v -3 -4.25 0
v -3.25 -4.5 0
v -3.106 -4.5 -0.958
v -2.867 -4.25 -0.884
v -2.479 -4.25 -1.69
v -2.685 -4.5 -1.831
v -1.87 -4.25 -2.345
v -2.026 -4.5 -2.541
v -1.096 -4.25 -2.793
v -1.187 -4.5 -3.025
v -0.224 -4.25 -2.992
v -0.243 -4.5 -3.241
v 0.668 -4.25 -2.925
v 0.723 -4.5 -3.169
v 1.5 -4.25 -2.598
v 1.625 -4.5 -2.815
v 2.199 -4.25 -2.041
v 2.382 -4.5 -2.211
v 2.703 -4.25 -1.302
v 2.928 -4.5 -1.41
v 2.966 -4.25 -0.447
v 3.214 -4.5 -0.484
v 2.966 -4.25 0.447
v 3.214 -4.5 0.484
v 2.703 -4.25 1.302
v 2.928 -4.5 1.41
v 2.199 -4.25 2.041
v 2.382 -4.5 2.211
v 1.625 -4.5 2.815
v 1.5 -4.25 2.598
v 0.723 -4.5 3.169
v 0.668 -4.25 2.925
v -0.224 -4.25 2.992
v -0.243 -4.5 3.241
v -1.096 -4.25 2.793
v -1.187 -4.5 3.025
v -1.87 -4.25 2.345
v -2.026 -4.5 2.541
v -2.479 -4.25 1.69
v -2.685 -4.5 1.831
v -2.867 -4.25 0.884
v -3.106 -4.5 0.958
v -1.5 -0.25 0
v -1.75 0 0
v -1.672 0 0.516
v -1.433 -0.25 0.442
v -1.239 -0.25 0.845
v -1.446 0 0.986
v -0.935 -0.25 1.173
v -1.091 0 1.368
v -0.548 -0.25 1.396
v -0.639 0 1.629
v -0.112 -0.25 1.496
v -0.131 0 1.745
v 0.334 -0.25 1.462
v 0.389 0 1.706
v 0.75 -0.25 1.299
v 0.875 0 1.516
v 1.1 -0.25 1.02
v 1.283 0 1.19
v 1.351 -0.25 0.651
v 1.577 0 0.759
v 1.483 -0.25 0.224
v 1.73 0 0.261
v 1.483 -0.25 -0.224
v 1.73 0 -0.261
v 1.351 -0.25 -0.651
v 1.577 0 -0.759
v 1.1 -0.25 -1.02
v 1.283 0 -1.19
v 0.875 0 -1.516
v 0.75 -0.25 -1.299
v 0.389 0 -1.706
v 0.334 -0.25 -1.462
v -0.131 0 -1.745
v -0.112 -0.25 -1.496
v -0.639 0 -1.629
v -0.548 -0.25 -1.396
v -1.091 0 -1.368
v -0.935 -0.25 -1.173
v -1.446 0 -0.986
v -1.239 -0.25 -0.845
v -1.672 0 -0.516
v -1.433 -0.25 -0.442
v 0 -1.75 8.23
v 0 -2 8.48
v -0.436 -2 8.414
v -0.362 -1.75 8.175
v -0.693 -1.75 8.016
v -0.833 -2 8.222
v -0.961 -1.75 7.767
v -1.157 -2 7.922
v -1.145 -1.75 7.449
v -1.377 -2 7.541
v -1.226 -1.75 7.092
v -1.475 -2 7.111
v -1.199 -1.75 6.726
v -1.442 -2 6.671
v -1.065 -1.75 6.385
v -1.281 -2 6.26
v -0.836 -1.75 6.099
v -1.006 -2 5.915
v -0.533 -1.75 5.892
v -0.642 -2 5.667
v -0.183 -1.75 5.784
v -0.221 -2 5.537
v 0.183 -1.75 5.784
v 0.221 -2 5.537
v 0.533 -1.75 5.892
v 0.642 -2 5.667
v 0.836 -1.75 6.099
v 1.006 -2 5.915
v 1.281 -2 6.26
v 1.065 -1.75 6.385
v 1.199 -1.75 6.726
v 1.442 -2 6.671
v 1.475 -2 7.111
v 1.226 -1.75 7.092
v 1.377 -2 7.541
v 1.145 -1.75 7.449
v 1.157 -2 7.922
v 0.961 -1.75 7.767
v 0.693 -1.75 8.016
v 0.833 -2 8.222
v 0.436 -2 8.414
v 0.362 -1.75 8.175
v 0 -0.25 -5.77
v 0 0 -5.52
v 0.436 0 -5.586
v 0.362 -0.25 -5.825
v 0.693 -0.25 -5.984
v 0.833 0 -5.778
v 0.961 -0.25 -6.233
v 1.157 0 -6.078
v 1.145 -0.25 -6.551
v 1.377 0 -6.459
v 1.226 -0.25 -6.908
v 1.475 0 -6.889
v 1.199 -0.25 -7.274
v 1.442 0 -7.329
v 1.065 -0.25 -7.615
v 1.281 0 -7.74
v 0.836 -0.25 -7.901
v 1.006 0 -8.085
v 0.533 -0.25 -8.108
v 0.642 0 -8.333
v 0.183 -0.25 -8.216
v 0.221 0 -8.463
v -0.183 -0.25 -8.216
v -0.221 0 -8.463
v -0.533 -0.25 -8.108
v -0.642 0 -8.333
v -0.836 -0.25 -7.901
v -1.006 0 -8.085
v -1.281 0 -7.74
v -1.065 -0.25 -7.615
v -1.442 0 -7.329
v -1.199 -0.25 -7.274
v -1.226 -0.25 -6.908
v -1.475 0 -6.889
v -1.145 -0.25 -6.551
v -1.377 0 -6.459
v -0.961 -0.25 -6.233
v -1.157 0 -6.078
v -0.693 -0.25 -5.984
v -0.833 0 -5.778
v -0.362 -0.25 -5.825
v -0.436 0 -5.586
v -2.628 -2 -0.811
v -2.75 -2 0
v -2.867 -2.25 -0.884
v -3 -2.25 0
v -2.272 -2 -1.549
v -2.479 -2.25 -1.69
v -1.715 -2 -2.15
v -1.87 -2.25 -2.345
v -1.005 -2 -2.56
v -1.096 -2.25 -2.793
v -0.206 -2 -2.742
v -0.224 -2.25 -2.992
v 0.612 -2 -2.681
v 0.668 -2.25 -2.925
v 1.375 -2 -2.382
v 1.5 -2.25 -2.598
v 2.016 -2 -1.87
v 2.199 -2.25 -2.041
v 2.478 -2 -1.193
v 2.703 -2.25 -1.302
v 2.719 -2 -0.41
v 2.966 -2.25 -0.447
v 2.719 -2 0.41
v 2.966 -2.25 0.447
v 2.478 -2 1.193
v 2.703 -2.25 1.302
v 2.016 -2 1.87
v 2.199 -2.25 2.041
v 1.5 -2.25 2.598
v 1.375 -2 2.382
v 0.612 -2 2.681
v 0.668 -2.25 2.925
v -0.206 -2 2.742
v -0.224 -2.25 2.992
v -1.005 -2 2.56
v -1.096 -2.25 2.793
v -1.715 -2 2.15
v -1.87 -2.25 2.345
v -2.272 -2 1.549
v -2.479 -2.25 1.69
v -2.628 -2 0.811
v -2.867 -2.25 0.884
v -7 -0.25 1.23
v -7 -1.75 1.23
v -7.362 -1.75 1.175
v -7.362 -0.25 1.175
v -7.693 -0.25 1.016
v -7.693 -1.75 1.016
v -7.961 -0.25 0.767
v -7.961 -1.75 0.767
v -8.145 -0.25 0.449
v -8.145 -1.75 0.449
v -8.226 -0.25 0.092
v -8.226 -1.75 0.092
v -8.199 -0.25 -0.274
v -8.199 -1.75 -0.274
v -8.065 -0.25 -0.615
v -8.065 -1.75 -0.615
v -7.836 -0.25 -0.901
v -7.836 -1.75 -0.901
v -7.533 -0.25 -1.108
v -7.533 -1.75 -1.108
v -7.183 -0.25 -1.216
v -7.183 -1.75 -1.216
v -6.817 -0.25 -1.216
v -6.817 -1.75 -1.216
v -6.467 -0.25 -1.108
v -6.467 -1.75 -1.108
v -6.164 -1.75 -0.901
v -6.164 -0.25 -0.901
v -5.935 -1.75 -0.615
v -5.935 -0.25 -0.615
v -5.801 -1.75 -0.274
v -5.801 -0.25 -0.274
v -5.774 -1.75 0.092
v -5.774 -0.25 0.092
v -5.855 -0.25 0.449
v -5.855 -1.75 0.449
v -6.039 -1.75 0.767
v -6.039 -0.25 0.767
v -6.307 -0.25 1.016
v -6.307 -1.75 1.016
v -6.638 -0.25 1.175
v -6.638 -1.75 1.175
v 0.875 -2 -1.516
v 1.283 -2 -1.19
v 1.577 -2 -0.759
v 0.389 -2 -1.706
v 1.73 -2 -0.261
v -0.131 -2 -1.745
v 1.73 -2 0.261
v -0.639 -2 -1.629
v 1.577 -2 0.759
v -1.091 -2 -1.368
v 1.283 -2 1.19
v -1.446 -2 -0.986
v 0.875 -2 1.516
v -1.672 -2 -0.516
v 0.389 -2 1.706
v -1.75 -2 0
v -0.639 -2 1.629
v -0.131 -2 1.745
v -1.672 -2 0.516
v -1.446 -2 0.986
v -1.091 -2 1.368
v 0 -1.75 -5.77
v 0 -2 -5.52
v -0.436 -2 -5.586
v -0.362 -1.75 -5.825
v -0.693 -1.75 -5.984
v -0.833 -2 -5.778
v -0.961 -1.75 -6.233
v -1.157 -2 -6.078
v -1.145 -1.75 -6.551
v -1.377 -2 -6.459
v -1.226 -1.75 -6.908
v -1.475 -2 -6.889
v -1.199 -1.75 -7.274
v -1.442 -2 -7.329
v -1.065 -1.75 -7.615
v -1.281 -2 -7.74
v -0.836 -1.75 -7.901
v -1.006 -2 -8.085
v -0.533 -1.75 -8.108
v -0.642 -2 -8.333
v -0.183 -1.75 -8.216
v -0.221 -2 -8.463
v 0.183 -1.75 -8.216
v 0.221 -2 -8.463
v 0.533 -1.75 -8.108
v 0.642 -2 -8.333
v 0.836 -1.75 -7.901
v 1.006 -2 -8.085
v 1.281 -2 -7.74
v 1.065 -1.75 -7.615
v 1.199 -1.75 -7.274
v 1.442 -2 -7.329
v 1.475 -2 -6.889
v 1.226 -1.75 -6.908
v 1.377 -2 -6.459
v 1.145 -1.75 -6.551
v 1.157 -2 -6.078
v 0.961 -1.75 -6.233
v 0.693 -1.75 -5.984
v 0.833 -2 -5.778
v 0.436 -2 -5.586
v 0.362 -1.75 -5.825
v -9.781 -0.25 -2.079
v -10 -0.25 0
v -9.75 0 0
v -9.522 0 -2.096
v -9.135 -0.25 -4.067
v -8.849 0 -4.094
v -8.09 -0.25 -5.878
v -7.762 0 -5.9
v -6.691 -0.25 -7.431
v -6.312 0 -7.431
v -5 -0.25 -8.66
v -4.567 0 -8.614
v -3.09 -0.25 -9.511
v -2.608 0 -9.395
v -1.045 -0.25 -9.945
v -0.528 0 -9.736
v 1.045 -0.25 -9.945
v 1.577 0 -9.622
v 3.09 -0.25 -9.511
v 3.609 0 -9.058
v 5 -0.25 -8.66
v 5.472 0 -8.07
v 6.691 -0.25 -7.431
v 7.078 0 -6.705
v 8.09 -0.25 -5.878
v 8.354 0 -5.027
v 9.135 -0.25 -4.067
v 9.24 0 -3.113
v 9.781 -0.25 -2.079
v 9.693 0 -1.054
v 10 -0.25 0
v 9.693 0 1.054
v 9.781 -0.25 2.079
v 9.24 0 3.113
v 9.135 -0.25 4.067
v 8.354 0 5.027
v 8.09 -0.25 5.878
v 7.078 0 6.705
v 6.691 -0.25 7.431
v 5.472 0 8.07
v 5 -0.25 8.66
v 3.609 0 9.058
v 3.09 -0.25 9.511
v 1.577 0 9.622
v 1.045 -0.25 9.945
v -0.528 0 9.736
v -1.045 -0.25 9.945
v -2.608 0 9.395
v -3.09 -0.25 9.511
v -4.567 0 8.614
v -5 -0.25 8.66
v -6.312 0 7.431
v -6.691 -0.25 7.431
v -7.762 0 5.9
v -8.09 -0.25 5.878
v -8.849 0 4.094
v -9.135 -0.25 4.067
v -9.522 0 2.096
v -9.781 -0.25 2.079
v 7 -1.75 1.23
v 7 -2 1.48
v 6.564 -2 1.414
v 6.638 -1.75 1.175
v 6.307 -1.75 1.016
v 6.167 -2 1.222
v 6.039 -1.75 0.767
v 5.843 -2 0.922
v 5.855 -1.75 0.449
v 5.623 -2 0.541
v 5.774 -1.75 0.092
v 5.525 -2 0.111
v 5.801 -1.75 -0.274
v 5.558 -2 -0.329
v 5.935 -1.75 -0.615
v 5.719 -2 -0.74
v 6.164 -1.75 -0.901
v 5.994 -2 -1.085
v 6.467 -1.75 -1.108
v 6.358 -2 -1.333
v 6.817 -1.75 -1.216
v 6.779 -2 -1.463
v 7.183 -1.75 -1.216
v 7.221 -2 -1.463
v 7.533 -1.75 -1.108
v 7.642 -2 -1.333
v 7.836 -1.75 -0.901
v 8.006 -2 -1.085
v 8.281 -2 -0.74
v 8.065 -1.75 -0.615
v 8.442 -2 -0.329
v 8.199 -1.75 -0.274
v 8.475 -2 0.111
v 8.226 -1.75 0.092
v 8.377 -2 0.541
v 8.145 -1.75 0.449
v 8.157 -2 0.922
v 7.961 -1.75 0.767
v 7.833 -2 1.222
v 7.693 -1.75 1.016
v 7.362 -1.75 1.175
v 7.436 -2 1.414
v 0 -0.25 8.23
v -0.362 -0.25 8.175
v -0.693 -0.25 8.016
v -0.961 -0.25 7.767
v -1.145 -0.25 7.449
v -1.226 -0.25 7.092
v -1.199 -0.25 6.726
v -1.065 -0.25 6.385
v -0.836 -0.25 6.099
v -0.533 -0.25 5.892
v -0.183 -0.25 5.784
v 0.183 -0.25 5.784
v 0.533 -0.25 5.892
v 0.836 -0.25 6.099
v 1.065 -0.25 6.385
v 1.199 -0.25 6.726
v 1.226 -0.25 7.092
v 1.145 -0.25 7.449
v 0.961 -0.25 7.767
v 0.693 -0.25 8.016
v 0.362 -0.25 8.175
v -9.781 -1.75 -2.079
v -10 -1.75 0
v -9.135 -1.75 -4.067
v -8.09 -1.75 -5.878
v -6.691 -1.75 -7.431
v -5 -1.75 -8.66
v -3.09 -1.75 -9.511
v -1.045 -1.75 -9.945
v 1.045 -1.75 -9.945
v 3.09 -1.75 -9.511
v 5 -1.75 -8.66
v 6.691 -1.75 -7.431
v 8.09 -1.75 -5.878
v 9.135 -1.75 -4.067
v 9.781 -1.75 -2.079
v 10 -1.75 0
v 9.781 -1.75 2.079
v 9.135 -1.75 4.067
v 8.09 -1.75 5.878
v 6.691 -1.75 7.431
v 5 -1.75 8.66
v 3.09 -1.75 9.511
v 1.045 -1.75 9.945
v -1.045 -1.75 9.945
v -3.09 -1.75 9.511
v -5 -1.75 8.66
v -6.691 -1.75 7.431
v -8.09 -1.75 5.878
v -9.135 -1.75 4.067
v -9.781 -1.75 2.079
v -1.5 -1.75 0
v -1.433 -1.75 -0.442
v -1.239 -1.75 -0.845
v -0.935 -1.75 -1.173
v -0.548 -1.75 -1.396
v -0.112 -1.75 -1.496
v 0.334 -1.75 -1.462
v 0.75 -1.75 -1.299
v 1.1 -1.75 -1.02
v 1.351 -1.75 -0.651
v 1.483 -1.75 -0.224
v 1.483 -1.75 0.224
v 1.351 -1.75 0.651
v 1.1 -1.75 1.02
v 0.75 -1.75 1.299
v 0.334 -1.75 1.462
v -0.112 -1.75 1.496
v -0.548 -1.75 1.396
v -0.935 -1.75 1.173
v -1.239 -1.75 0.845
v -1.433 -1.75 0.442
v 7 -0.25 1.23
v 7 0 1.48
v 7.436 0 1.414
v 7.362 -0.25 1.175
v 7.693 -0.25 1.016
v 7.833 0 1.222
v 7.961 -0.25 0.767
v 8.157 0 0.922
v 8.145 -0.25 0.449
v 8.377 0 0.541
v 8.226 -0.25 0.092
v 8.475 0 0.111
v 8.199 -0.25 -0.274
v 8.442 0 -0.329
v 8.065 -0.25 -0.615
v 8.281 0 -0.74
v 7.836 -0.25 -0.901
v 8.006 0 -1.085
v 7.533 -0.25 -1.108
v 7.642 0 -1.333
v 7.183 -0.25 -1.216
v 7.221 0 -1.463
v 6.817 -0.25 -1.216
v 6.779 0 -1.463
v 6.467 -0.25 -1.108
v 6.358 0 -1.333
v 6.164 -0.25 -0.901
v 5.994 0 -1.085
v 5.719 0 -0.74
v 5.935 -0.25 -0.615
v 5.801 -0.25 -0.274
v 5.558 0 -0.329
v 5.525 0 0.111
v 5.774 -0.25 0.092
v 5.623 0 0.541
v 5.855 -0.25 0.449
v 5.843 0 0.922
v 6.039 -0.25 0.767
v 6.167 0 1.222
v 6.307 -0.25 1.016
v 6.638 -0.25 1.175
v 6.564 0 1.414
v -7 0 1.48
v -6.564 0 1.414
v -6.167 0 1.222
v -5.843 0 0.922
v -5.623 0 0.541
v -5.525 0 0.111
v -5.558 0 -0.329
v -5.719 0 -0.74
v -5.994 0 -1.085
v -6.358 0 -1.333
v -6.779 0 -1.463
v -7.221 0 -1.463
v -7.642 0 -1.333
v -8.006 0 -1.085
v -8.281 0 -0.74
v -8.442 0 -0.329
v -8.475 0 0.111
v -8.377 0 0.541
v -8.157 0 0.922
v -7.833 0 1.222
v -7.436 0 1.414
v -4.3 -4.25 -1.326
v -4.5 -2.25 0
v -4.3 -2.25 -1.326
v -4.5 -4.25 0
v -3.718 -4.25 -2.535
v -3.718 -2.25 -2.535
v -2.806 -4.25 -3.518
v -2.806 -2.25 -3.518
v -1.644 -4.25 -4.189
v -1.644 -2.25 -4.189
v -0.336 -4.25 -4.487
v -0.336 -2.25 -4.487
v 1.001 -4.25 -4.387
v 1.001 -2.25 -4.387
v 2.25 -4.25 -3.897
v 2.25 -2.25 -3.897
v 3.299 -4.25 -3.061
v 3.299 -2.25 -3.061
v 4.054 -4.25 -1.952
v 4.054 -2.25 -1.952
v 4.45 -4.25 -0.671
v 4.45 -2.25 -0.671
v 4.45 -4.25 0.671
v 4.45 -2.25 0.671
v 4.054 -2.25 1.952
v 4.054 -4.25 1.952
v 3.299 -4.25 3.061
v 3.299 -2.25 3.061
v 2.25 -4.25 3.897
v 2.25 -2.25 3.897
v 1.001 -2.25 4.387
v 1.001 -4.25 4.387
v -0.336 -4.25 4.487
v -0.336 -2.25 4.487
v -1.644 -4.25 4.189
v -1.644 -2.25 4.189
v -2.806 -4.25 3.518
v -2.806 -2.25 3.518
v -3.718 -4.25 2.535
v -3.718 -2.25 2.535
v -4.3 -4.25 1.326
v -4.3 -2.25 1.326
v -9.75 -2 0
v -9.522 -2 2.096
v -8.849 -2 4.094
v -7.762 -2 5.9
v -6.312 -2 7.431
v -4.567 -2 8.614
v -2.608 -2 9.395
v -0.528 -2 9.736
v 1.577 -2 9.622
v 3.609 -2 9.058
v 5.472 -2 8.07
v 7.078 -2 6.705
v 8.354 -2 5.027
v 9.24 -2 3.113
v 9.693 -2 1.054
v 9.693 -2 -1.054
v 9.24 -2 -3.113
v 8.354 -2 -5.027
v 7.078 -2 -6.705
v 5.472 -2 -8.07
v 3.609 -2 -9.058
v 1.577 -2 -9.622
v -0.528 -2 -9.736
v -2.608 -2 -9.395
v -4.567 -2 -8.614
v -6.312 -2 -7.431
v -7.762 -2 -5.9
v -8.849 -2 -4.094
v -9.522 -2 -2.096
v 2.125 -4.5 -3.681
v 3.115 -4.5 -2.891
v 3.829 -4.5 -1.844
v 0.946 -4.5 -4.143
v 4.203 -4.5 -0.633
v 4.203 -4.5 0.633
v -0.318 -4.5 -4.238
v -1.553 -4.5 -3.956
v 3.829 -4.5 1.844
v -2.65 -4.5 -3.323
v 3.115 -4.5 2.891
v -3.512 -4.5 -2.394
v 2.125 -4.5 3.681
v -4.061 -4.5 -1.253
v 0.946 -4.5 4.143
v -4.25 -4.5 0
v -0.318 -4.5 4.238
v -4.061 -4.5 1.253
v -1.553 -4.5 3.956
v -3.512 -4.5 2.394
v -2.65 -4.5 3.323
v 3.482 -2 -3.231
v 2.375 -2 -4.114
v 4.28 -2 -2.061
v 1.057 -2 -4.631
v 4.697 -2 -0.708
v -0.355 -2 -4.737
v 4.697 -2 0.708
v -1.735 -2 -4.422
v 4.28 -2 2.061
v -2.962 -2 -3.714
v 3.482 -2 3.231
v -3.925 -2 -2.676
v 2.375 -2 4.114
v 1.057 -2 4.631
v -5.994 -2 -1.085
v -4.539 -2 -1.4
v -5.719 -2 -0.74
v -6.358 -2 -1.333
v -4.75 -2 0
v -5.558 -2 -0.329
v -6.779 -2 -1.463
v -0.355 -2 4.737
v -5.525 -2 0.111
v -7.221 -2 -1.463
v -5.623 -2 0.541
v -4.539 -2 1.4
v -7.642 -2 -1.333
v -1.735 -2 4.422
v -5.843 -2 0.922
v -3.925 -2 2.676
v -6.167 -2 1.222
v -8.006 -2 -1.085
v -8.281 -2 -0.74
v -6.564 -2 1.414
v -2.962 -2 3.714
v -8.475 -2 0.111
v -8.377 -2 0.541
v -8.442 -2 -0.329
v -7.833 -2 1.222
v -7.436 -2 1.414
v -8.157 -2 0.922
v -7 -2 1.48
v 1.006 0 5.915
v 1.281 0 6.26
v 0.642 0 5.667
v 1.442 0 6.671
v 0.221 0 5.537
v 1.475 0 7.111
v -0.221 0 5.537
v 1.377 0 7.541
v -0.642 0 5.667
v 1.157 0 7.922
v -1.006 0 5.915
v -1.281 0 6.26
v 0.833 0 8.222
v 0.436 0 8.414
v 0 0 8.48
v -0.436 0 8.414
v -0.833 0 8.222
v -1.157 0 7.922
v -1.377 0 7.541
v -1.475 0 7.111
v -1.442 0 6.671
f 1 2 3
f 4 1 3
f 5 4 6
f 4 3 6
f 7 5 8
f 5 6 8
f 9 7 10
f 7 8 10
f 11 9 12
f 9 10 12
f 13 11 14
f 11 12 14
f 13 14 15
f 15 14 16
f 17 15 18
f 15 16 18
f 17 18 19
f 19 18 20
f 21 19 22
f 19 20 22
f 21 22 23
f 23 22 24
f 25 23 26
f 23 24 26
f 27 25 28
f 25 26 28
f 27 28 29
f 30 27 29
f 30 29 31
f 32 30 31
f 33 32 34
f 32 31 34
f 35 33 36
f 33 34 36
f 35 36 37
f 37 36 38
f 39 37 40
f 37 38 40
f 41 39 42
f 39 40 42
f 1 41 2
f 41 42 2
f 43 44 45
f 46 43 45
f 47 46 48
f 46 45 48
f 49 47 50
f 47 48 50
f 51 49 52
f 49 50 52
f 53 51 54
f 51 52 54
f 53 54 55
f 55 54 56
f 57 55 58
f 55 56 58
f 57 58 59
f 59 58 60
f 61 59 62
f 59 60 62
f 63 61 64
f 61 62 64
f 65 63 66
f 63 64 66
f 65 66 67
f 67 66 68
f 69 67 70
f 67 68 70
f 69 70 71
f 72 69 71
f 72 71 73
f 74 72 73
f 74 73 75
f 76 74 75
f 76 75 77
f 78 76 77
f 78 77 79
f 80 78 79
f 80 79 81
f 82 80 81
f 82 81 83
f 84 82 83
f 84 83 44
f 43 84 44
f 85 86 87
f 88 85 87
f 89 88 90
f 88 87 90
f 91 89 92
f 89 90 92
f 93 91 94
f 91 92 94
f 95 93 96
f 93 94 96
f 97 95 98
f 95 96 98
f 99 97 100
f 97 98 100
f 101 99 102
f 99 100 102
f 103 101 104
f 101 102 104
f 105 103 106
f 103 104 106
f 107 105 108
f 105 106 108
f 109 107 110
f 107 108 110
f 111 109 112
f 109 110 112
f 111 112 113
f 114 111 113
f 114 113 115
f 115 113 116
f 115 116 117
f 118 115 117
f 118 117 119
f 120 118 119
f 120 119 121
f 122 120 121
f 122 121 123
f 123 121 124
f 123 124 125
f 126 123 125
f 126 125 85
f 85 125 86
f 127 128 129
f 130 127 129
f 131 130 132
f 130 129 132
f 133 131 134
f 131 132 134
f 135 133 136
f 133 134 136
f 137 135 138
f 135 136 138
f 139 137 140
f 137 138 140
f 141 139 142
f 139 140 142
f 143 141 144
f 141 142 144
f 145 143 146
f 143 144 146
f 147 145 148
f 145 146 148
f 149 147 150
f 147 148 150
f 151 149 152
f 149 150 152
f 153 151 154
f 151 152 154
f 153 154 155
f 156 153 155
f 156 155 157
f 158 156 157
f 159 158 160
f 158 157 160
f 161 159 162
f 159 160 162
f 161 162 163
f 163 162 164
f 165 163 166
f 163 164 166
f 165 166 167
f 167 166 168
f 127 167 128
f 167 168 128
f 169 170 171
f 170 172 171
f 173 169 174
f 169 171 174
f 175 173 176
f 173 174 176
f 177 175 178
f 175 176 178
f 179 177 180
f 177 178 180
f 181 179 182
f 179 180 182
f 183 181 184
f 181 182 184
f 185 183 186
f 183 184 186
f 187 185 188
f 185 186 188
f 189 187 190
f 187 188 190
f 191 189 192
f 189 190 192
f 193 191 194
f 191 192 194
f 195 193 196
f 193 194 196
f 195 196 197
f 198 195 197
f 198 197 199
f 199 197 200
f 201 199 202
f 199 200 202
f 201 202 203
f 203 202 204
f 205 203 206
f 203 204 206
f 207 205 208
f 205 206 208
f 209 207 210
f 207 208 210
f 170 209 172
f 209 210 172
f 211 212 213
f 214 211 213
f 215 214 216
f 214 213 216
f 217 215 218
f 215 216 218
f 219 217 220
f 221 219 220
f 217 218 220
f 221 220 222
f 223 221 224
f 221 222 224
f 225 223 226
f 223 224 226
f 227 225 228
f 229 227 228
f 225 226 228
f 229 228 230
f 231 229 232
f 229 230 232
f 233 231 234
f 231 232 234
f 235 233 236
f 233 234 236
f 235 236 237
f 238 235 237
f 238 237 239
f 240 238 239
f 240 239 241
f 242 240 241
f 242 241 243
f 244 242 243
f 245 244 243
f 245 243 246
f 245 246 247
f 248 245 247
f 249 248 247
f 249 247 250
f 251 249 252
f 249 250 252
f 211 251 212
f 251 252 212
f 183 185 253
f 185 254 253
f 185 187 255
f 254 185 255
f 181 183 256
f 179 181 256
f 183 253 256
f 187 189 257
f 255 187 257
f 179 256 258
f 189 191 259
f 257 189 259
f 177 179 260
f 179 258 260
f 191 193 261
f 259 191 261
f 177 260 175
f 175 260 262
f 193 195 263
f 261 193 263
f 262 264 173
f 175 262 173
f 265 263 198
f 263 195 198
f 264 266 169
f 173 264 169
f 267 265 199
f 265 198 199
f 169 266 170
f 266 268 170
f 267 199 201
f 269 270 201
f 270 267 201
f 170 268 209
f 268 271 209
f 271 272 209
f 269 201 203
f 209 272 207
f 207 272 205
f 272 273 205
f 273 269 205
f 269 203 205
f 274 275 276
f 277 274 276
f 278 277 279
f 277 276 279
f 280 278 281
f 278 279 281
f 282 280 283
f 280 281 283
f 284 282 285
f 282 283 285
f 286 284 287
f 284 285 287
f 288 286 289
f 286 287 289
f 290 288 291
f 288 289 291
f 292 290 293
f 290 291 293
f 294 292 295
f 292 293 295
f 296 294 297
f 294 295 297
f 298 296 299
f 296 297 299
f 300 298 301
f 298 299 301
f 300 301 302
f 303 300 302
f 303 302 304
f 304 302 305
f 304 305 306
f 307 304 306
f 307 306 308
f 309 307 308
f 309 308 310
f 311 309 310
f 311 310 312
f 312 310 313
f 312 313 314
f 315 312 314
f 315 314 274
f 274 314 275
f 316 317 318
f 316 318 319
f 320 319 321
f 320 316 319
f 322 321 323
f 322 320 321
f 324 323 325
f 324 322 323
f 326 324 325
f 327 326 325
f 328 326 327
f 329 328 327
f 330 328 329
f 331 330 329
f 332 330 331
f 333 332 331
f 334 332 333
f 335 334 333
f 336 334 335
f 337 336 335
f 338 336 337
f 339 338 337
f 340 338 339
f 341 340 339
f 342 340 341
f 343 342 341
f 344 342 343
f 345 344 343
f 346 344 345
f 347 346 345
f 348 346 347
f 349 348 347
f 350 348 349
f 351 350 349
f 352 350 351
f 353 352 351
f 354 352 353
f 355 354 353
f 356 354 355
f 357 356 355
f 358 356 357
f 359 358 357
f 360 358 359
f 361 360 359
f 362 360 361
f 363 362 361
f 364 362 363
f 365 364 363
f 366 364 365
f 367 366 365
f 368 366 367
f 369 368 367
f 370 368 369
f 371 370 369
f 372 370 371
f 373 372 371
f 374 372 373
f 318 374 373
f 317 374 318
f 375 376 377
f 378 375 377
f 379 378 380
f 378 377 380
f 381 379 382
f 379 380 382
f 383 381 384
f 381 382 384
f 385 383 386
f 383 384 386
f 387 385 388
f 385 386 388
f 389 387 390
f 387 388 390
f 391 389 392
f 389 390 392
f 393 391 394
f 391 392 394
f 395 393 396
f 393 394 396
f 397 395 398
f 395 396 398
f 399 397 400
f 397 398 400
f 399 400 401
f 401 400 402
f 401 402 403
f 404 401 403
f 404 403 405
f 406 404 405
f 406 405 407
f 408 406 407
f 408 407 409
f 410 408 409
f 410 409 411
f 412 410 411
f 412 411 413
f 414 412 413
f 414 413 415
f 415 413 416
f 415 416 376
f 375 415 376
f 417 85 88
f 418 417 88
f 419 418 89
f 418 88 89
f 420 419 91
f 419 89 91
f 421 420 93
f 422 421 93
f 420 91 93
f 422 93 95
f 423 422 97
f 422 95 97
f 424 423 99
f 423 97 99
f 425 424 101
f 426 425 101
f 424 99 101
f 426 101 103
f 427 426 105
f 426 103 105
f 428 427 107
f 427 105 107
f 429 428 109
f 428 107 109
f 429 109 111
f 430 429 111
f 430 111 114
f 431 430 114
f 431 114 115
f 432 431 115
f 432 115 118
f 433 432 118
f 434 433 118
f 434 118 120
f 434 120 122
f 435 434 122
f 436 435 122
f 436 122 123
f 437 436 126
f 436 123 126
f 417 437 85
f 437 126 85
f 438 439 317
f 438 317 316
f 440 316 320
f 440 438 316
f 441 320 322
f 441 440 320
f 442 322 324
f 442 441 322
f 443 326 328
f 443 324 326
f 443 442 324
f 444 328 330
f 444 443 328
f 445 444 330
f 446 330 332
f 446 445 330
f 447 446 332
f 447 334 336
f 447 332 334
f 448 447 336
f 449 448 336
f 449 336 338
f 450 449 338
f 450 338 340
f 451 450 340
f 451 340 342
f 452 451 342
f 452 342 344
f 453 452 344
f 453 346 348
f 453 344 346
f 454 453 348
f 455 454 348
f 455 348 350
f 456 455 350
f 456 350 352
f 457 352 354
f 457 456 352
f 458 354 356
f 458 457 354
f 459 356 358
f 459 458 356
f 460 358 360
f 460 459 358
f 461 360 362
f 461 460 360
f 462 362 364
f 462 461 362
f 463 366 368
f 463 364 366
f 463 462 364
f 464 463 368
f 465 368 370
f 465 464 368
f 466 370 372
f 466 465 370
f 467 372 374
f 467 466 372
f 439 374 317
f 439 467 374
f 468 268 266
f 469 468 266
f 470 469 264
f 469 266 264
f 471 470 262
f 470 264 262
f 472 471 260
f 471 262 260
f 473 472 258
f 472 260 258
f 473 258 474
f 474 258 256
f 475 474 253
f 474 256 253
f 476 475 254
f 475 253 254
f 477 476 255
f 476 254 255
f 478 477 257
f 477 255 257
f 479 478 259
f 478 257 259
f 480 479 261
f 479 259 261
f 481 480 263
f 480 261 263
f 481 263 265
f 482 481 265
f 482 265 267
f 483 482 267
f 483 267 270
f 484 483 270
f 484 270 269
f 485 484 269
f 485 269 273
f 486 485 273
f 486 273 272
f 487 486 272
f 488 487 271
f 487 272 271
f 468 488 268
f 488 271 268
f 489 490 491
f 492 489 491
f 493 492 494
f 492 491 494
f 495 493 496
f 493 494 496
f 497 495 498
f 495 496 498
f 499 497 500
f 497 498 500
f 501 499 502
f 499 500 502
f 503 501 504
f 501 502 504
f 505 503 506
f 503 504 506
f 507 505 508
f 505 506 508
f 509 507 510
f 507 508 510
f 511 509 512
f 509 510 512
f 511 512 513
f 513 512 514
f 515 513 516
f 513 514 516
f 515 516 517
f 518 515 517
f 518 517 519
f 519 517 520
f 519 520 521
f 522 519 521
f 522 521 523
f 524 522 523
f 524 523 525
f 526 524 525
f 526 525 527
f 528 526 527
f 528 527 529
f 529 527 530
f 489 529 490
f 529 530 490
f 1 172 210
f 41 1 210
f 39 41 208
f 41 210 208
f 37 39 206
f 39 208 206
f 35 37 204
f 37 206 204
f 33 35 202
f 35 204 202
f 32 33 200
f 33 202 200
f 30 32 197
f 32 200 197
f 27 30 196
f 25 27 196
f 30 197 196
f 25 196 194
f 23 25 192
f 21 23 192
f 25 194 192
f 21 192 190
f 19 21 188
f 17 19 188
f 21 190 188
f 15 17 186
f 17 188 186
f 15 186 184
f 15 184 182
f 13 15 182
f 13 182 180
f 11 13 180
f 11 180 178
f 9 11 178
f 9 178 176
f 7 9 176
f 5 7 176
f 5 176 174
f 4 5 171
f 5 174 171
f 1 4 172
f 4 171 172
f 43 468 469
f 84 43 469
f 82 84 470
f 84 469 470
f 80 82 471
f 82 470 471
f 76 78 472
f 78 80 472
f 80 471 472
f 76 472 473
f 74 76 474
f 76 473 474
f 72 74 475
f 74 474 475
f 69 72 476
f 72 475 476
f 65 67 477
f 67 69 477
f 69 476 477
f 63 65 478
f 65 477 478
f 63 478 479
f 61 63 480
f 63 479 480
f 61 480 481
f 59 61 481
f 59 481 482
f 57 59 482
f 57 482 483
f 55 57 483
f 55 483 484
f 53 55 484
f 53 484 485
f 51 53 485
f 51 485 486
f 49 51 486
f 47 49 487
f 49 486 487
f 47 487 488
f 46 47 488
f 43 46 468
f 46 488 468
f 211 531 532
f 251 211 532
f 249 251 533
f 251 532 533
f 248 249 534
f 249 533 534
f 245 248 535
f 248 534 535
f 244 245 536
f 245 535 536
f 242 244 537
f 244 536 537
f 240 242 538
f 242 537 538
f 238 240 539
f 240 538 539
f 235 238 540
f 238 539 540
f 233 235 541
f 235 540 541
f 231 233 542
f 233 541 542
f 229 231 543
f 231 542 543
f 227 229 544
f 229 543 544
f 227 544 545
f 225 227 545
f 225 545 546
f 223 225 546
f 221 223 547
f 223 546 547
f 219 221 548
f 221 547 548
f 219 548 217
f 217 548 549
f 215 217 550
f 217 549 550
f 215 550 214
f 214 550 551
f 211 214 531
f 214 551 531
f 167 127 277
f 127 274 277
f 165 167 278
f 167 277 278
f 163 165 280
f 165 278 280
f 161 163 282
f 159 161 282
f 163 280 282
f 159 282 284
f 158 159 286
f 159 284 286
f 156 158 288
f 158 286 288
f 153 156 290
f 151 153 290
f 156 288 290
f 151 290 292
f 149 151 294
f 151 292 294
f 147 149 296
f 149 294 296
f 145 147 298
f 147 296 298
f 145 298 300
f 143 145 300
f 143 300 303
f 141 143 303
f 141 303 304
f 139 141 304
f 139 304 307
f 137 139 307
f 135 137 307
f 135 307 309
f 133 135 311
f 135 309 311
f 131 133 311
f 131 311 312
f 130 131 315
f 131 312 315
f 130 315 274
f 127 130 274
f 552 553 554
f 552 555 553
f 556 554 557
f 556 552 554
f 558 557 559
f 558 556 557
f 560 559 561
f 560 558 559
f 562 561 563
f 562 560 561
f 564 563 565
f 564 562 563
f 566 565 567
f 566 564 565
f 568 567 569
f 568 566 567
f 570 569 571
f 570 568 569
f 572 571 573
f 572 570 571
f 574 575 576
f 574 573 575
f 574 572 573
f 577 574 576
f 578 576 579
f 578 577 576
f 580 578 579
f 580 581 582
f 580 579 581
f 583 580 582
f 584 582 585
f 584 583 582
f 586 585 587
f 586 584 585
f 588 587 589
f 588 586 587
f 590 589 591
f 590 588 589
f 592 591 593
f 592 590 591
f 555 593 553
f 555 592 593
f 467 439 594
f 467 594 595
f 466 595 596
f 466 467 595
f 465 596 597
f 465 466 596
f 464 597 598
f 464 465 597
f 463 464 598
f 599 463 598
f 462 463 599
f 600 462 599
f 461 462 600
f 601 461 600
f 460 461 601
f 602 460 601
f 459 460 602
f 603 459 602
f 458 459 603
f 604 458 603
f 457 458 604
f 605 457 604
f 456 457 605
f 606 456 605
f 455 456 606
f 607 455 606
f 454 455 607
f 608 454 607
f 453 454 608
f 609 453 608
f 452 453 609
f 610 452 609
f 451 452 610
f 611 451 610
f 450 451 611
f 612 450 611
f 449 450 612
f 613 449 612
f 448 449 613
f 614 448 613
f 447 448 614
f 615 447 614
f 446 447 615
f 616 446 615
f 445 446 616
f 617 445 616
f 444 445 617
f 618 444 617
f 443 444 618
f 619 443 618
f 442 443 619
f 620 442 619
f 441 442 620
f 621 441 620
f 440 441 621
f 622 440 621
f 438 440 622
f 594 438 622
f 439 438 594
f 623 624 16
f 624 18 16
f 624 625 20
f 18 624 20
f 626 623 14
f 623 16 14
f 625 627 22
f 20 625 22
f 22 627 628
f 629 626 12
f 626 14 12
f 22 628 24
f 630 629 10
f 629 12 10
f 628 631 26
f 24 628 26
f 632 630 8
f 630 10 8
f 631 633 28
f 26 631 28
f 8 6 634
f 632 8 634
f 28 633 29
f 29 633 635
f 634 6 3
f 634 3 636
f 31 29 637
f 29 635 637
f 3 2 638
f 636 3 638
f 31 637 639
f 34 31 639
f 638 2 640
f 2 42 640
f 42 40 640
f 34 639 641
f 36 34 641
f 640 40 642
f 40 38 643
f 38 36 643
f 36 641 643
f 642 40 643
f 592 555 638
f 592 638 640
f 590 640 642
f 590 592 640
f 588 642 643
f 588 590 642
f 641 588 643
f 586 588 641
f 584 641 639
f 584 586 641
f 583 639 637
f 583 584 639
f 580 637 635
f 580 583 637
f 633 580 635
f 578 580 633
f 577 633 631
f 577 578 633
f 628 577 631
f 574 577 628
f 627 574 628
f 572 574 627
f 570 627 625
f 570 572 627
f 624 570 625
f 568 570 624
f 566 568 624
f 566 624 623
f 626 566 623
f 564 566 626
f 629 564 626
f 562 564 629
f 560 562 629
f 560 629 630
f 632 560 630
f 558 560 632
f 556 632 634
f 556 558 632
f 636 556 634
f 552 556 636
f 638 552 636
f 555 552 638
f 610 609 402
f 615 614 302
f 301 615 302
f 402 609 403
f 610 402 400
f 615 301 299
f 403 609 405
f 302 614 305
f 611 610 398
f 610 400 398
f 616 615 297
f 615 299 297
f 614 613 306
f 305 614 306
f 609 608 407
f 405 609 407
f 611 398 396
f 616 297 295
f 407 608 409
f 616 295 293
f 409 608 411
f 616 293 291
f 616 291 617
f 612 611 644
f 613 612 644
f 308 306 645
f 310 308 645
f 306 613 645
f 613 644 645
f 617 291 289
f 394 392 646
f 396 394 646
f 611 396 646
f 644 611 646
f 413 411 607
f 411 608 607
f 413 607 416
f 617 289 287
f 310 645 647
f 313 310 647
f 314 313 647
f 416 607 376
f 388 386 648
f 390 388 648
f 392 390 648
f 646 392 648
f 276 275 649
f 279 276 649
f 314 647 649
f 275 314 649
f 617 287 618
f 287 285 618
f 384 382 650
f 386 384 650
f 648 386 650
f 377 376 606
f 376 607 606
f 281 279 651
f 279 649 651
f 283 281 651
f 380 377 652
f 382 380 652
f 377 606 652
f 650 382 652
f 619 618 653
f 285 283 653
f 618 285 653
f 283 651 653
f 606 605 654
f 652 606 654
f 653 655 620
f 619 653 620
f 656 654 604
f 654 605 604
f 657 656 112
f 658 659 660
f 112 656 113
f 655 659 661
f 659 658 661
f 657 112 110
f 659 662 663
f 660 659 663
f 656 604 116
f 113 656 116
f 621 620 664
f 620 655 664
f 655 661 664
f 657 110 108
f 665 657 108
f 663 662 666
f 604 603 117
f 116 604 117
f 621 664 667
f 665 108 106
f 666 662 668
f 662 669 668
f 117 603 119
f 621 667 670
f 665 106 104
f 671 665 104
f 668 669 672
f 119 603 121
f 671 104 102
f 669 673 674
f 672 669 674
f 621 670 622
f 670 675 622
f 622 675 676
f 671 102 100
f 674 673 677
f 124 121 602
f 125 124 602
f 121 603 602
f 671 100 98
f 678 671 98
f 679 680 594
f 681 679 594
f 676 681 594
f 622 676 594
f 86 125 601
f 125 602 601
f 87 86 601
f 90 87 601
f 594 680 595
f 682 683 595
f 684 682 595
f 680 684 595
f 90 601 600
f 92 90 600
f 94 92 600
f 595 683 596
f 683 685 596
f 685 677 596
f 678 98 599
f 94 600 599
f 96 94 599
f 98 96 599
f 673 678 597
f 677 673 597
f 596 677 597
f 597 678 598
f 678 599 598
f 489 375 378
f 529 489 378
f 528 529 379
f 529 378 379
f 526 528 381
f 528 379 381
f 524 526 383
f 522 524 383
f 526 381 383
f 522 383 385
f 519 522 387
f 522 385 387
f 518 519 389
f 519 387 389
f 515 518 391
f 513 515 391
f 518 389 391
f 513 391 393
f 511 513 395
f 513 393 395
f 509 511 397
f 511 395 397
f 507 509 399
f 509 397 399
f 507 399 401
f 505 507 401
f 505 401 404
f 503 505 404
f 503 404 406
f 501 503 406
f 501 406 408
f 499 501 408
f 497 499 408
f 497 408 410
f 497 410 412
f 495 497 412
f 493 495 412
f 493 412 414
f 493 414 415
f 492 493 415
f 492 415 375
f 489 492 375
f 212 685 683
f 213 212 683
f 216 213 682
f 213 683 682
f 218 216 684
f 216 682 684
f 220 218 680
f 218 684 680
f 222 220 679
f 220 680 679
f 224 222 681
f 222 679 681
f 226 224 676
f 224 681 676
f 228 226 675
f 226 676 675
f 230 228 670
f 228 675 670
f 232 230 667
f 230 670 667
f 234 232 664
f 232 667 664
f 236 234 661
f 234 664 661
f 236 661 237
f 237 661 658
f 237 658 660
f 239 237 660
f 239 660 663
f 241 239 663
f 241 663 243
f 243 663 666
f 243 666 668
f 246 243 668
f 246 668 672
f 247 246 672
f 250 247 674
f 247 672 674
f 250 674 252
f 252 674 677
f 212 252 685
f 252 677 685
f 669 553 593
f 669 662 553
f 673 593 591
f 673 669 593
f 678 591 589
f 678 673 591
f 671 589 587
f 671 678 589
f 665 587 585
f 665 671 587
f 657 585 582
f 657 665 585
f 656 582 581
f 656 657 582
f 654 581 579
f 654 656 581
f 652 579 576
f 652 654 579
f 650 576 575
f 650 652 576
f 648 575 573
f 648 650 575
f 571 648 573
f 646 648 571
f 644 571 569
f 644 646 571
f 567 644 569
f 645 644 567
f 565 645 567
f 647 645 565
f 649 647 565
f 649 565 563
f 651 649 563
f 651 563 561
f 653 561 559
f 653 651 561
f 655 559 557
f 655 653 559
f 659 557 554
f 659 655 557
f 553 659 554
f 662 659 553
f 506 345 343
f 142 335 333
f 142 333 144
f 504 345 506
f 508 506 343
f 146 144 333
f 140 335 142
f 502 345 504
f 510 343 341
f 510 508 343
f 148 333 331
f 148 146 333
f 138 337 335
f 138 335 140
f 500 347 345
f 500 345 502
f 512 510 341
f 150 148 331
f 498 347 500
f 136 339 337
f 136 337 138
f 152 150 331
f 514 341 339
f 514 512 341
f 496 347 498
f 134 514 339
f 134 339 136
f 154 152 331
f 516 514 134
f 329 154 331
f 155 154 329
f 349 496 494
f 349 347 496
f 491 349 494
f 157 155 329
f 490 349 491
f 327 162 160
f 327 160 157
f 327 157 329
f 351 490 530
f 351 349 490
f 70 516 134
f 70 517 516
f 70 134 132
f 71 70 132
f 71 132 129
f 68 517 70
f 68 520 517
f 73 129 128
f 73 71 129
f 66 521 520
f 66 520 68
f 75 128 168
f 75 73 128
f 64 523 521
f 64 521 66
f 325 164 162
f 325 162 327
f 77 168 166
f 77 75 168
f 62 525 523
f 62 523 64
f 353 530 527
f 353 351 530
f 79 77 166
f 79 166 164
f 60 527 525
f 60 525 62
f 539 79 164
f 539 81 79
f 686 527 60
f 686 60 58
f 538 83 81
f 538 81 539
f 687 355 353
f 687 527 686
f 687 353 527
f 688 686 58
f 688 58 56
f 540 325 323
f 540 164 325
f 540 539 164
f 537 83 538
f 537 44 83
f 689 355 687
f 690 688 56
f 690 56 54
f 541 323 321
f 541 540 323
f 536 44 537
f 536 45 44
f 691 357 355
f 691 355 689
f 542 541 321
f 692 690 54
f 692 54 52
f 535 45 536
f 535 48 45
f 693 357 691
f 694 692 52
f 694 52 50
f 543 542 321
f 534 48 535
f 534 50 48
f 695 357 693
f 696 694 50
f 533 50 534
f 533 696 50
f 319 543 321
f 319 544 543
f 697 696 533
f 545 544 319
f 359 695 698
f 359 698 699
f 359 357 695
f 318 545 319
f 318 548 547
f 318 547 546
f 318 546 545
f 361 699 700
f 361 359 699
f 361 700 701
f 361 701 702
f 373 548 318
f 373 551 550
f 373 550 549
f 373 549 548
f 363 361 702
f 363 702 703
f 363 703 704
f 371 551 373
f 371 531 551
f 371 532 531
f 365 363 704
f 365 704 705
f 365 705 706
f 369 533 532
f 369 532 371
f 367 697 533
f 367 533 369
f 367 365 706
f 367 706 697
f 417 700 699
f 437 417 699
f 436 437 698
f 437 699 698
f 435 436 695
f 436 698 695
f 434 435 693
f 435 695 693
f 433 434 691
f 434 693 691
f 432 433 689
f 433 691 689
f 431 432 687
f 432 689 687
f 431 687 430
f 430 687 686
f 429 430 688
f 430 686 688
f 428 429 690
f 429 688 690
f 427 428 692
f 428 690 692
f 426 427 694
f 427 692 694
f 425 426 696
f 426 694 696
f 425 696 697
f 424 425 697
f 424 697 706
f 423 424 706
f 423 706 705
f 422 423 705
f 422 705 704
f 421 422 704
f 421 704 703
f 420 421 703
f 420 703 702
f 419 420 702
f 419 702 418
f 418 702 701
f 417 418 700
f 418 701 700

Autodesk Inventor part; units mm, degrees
ref_plane "YZ Plane" through (0, 0, 0) normal (1, 0, 0) x (0, 1, 0)
ref_plane "XZ Plane" through (0, 0, 0) normal (0, 1, 0) x (-1, 0, 0)
ref_plane "XY Plane" through (0, 0, 0) normal (0, 0, 1) x (1, 0, 0)
sketch "Sketch1" plane through (0, 0, 0) normal (0, 0, 1) x (1, 0, 0)
  line L0 (-12, 0) -> (2, 0) construction
  line L1 (0, -5.4) -> (0, 0.9) construction
  line L2 (-1.5, 0) -> (-10, 0)
  line L3 (-10, 0) -> (-10, -2)
  line L4 (-10, -2) -> (-4.5, -2)
  line L5 (-4.5, -2) -> (-4.5, -4.5)
  line L6 (-4.5, -4.5) -> (-3, -4.5)
  line L7 (-3, -4.5) -> (-3, -2)
  line L8 (-3, -2) -> (-1.5, -2)
  line L9 (-1.5, 0) -> (-1.5, -2)
  point P0 (0, 0)
  dimension "d0" = 1.5
  dimension "d1" = 3
  dimension "d2" = 4.5
  dimension "d3" = 10
  dimension "d4" = 2
  dimension "d5" = 4.5
revolve "Revolution1" add sketch "Sketch1" angle 360 about axis through (0, -10, 0) along (0, 1, 0)
sketch "Sketch2" plane through (0, 0, 0) normal (0, 1, 0) x (1, 0, 0)
  line L0 (-14, 0) -> (14, 0) construction
  line L1 (0, 14) -> (0, -14) construction
  point P0 (0, 0)
  point P1 (0, 7)
  point P2 (0, -7)
  point P3 (-7, 0)
  point P4 (7, 0)
  dimension "d7" = 14
  dimension "d8" = 14
hole "Hole1" at (0, 0, -7) at (0, 0, 7) at (-7, 0, 0) at (7, 0, 0) direction (0, -1, 0) diameter 2.459 depth 8.8 thread size "M3x0.5" class "6H" standard "ISO Metric profile"
chamfer "Chamfer1" distance 0.25 angle 45 16 edges at (10, 0, 0) (10, -2, 0) (0, 0, -8.2295) (7, 0, -1.2295) (-7, 0, -1.2295) (0, 0, 5.7705) (4.5, -2, 0) (4.5, -4.5, 0) (3, -4.5, 0) (3, -2, 0) (1.5, -2, 0) (1.5, 0, 0) (0, -2, -8.2295) (7, -2, -1.2295) (-7, -2, -1.2295) (0, -2, 5.7705)
properties part number "motortarcsa"
